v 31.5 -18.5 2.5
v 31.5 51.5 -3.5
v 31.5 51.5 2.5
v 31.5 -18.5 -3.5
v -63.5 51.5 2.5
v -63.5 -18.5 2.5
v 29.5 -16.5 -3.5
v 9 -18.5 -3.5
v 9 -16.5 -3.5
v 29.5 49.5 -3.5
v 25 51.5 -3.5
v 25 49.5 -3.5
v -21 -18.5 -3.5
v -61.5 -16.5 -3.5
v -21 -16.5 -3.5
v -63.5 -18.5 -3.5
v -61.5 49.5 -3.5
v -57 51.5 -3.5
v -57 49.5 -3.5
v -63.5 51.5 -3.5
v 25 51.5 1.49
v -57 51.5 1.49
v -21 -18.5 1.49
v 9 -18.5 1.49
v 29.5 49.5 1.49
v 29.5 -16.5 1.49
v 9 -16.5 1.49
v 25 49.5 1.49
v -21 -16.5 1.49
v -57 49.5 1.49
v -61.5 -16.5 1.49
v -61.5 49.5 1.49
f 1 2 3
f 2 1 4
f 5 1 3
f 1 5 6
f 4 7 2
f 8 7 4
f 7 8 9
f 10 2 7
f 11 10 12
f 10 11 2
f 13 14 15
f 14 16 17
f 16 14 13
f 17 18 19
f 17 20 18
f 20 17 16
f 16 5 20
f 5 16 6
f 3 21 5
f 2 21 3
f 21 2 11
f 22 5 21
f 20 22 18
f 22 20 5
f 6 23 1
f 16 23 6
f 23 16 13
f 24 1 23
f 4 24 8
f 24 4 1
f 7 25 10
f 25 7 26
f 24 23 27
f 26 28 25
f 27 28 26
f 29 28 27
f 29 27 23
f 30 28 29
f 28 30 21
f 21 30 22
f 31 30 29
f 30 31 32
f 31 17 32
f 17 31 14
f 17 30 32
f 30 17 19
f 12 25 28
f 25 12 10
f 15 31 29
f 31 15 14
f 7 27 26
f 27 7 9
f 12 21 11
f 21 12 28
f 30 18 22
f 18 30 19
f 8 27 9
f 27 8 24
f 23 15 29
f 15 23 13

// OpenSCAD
module screen()
{
    //color("black")
        translate([2-(2+5)/2,7-(7+3)/2,2.5])
            cube([165-(2+5),100-(7+3),1], center=true);
    cube([165+2,100+1.5,4], center=true);
    //color("blue")
        translate([-2,-52.5,0])
            cube([42,5,4], center=true);
}

module front()
{
    difference() {
        cube([175,115,5], center=true);
        translate([0,0,-0.5])
            screen();

        translate([((175-4)/2-1.5),((115-4)/2-1.5),0])
            cylinder(d=4, h=20, center=true, $fn=16);
        translate([-((175-4)/2-1.5),((115-4)/2-1.5),0])
            cylinder(d=4, h=20, center=true, $fn=16);
        translate([-((175-4)/2-1.5),-((115-4)/2-1.5),0])
            cylinder(d=4, h=20, center=true, $fn=16);
        translate([((175-4)/2-1.5),-((115-4)/2-1.5),0])
            cylinder(d=4, h=20, center=true, $fn=16);
    }
}

module back()
{
    
    translate([0,0,4])
        difference() {
            cube([177,117,7], center=true);
            translate([0,0,-2.5])
                cube([175,115,5.01], center=true);
            translate([0,0,2.5])
                cube([175+1,115+1,5.01], center=true);
        }
    difference() {
        translate([0,0,1.5])
            cube([175,115,2], center=true);
        
        translate([0,0,1.5])
            cube([155,95,2.01], center=true);
        
        translate([((175-4)/2-1.5),((115-4)/2-1.5),0])
            cylinder(d=4, h=20, center=true, $fn=16);
        translate([-((175-4)/2-1.5),((115-4)/2-1.5),0])
            cylinder(d=4, h=20, center=true, $fn=16);
        translate([-((175-4)/2-1.5),-((115-4)/2-1.5),0])
            cylinder(d=4, h=20, center=true, $fn=16);
        translate([((175-4)/2-1.5),-((115-4)/2-1.5),0])
            cylinder(d=4, h=20, center=true, $fn=16);

    }
    
//    translate([16-(16+48)/2,33/2,1.5])
//        cube([90.5,65.5,2], center=true);

    translate([0,43,1.5])
        cube([175,10,2], center=true);

    translate([0,-11.25,1.5])
        cube([175,10,2], center=true);

    translate([0,0,1.5])
        cube([10,115,2], center=true);
}

module pcbmount()
{
    translate([16-(16+48)/2,33/2,-0.5])
        difference() {
            cube([95,70,6], center=true);
            translate([0,0,-0.51])
                cube([91,66,5], center=true);
            translate([0,35,-0.51])
                cube([82,5,5], center=true);
            translate([10,-35,-0.51])
                cube([30,5,5], center=true);
        }
}


//front();
//translate([0,0,-5]) {
//    back();
//    translate([0,0,-2])
        pcbmount();
//}
